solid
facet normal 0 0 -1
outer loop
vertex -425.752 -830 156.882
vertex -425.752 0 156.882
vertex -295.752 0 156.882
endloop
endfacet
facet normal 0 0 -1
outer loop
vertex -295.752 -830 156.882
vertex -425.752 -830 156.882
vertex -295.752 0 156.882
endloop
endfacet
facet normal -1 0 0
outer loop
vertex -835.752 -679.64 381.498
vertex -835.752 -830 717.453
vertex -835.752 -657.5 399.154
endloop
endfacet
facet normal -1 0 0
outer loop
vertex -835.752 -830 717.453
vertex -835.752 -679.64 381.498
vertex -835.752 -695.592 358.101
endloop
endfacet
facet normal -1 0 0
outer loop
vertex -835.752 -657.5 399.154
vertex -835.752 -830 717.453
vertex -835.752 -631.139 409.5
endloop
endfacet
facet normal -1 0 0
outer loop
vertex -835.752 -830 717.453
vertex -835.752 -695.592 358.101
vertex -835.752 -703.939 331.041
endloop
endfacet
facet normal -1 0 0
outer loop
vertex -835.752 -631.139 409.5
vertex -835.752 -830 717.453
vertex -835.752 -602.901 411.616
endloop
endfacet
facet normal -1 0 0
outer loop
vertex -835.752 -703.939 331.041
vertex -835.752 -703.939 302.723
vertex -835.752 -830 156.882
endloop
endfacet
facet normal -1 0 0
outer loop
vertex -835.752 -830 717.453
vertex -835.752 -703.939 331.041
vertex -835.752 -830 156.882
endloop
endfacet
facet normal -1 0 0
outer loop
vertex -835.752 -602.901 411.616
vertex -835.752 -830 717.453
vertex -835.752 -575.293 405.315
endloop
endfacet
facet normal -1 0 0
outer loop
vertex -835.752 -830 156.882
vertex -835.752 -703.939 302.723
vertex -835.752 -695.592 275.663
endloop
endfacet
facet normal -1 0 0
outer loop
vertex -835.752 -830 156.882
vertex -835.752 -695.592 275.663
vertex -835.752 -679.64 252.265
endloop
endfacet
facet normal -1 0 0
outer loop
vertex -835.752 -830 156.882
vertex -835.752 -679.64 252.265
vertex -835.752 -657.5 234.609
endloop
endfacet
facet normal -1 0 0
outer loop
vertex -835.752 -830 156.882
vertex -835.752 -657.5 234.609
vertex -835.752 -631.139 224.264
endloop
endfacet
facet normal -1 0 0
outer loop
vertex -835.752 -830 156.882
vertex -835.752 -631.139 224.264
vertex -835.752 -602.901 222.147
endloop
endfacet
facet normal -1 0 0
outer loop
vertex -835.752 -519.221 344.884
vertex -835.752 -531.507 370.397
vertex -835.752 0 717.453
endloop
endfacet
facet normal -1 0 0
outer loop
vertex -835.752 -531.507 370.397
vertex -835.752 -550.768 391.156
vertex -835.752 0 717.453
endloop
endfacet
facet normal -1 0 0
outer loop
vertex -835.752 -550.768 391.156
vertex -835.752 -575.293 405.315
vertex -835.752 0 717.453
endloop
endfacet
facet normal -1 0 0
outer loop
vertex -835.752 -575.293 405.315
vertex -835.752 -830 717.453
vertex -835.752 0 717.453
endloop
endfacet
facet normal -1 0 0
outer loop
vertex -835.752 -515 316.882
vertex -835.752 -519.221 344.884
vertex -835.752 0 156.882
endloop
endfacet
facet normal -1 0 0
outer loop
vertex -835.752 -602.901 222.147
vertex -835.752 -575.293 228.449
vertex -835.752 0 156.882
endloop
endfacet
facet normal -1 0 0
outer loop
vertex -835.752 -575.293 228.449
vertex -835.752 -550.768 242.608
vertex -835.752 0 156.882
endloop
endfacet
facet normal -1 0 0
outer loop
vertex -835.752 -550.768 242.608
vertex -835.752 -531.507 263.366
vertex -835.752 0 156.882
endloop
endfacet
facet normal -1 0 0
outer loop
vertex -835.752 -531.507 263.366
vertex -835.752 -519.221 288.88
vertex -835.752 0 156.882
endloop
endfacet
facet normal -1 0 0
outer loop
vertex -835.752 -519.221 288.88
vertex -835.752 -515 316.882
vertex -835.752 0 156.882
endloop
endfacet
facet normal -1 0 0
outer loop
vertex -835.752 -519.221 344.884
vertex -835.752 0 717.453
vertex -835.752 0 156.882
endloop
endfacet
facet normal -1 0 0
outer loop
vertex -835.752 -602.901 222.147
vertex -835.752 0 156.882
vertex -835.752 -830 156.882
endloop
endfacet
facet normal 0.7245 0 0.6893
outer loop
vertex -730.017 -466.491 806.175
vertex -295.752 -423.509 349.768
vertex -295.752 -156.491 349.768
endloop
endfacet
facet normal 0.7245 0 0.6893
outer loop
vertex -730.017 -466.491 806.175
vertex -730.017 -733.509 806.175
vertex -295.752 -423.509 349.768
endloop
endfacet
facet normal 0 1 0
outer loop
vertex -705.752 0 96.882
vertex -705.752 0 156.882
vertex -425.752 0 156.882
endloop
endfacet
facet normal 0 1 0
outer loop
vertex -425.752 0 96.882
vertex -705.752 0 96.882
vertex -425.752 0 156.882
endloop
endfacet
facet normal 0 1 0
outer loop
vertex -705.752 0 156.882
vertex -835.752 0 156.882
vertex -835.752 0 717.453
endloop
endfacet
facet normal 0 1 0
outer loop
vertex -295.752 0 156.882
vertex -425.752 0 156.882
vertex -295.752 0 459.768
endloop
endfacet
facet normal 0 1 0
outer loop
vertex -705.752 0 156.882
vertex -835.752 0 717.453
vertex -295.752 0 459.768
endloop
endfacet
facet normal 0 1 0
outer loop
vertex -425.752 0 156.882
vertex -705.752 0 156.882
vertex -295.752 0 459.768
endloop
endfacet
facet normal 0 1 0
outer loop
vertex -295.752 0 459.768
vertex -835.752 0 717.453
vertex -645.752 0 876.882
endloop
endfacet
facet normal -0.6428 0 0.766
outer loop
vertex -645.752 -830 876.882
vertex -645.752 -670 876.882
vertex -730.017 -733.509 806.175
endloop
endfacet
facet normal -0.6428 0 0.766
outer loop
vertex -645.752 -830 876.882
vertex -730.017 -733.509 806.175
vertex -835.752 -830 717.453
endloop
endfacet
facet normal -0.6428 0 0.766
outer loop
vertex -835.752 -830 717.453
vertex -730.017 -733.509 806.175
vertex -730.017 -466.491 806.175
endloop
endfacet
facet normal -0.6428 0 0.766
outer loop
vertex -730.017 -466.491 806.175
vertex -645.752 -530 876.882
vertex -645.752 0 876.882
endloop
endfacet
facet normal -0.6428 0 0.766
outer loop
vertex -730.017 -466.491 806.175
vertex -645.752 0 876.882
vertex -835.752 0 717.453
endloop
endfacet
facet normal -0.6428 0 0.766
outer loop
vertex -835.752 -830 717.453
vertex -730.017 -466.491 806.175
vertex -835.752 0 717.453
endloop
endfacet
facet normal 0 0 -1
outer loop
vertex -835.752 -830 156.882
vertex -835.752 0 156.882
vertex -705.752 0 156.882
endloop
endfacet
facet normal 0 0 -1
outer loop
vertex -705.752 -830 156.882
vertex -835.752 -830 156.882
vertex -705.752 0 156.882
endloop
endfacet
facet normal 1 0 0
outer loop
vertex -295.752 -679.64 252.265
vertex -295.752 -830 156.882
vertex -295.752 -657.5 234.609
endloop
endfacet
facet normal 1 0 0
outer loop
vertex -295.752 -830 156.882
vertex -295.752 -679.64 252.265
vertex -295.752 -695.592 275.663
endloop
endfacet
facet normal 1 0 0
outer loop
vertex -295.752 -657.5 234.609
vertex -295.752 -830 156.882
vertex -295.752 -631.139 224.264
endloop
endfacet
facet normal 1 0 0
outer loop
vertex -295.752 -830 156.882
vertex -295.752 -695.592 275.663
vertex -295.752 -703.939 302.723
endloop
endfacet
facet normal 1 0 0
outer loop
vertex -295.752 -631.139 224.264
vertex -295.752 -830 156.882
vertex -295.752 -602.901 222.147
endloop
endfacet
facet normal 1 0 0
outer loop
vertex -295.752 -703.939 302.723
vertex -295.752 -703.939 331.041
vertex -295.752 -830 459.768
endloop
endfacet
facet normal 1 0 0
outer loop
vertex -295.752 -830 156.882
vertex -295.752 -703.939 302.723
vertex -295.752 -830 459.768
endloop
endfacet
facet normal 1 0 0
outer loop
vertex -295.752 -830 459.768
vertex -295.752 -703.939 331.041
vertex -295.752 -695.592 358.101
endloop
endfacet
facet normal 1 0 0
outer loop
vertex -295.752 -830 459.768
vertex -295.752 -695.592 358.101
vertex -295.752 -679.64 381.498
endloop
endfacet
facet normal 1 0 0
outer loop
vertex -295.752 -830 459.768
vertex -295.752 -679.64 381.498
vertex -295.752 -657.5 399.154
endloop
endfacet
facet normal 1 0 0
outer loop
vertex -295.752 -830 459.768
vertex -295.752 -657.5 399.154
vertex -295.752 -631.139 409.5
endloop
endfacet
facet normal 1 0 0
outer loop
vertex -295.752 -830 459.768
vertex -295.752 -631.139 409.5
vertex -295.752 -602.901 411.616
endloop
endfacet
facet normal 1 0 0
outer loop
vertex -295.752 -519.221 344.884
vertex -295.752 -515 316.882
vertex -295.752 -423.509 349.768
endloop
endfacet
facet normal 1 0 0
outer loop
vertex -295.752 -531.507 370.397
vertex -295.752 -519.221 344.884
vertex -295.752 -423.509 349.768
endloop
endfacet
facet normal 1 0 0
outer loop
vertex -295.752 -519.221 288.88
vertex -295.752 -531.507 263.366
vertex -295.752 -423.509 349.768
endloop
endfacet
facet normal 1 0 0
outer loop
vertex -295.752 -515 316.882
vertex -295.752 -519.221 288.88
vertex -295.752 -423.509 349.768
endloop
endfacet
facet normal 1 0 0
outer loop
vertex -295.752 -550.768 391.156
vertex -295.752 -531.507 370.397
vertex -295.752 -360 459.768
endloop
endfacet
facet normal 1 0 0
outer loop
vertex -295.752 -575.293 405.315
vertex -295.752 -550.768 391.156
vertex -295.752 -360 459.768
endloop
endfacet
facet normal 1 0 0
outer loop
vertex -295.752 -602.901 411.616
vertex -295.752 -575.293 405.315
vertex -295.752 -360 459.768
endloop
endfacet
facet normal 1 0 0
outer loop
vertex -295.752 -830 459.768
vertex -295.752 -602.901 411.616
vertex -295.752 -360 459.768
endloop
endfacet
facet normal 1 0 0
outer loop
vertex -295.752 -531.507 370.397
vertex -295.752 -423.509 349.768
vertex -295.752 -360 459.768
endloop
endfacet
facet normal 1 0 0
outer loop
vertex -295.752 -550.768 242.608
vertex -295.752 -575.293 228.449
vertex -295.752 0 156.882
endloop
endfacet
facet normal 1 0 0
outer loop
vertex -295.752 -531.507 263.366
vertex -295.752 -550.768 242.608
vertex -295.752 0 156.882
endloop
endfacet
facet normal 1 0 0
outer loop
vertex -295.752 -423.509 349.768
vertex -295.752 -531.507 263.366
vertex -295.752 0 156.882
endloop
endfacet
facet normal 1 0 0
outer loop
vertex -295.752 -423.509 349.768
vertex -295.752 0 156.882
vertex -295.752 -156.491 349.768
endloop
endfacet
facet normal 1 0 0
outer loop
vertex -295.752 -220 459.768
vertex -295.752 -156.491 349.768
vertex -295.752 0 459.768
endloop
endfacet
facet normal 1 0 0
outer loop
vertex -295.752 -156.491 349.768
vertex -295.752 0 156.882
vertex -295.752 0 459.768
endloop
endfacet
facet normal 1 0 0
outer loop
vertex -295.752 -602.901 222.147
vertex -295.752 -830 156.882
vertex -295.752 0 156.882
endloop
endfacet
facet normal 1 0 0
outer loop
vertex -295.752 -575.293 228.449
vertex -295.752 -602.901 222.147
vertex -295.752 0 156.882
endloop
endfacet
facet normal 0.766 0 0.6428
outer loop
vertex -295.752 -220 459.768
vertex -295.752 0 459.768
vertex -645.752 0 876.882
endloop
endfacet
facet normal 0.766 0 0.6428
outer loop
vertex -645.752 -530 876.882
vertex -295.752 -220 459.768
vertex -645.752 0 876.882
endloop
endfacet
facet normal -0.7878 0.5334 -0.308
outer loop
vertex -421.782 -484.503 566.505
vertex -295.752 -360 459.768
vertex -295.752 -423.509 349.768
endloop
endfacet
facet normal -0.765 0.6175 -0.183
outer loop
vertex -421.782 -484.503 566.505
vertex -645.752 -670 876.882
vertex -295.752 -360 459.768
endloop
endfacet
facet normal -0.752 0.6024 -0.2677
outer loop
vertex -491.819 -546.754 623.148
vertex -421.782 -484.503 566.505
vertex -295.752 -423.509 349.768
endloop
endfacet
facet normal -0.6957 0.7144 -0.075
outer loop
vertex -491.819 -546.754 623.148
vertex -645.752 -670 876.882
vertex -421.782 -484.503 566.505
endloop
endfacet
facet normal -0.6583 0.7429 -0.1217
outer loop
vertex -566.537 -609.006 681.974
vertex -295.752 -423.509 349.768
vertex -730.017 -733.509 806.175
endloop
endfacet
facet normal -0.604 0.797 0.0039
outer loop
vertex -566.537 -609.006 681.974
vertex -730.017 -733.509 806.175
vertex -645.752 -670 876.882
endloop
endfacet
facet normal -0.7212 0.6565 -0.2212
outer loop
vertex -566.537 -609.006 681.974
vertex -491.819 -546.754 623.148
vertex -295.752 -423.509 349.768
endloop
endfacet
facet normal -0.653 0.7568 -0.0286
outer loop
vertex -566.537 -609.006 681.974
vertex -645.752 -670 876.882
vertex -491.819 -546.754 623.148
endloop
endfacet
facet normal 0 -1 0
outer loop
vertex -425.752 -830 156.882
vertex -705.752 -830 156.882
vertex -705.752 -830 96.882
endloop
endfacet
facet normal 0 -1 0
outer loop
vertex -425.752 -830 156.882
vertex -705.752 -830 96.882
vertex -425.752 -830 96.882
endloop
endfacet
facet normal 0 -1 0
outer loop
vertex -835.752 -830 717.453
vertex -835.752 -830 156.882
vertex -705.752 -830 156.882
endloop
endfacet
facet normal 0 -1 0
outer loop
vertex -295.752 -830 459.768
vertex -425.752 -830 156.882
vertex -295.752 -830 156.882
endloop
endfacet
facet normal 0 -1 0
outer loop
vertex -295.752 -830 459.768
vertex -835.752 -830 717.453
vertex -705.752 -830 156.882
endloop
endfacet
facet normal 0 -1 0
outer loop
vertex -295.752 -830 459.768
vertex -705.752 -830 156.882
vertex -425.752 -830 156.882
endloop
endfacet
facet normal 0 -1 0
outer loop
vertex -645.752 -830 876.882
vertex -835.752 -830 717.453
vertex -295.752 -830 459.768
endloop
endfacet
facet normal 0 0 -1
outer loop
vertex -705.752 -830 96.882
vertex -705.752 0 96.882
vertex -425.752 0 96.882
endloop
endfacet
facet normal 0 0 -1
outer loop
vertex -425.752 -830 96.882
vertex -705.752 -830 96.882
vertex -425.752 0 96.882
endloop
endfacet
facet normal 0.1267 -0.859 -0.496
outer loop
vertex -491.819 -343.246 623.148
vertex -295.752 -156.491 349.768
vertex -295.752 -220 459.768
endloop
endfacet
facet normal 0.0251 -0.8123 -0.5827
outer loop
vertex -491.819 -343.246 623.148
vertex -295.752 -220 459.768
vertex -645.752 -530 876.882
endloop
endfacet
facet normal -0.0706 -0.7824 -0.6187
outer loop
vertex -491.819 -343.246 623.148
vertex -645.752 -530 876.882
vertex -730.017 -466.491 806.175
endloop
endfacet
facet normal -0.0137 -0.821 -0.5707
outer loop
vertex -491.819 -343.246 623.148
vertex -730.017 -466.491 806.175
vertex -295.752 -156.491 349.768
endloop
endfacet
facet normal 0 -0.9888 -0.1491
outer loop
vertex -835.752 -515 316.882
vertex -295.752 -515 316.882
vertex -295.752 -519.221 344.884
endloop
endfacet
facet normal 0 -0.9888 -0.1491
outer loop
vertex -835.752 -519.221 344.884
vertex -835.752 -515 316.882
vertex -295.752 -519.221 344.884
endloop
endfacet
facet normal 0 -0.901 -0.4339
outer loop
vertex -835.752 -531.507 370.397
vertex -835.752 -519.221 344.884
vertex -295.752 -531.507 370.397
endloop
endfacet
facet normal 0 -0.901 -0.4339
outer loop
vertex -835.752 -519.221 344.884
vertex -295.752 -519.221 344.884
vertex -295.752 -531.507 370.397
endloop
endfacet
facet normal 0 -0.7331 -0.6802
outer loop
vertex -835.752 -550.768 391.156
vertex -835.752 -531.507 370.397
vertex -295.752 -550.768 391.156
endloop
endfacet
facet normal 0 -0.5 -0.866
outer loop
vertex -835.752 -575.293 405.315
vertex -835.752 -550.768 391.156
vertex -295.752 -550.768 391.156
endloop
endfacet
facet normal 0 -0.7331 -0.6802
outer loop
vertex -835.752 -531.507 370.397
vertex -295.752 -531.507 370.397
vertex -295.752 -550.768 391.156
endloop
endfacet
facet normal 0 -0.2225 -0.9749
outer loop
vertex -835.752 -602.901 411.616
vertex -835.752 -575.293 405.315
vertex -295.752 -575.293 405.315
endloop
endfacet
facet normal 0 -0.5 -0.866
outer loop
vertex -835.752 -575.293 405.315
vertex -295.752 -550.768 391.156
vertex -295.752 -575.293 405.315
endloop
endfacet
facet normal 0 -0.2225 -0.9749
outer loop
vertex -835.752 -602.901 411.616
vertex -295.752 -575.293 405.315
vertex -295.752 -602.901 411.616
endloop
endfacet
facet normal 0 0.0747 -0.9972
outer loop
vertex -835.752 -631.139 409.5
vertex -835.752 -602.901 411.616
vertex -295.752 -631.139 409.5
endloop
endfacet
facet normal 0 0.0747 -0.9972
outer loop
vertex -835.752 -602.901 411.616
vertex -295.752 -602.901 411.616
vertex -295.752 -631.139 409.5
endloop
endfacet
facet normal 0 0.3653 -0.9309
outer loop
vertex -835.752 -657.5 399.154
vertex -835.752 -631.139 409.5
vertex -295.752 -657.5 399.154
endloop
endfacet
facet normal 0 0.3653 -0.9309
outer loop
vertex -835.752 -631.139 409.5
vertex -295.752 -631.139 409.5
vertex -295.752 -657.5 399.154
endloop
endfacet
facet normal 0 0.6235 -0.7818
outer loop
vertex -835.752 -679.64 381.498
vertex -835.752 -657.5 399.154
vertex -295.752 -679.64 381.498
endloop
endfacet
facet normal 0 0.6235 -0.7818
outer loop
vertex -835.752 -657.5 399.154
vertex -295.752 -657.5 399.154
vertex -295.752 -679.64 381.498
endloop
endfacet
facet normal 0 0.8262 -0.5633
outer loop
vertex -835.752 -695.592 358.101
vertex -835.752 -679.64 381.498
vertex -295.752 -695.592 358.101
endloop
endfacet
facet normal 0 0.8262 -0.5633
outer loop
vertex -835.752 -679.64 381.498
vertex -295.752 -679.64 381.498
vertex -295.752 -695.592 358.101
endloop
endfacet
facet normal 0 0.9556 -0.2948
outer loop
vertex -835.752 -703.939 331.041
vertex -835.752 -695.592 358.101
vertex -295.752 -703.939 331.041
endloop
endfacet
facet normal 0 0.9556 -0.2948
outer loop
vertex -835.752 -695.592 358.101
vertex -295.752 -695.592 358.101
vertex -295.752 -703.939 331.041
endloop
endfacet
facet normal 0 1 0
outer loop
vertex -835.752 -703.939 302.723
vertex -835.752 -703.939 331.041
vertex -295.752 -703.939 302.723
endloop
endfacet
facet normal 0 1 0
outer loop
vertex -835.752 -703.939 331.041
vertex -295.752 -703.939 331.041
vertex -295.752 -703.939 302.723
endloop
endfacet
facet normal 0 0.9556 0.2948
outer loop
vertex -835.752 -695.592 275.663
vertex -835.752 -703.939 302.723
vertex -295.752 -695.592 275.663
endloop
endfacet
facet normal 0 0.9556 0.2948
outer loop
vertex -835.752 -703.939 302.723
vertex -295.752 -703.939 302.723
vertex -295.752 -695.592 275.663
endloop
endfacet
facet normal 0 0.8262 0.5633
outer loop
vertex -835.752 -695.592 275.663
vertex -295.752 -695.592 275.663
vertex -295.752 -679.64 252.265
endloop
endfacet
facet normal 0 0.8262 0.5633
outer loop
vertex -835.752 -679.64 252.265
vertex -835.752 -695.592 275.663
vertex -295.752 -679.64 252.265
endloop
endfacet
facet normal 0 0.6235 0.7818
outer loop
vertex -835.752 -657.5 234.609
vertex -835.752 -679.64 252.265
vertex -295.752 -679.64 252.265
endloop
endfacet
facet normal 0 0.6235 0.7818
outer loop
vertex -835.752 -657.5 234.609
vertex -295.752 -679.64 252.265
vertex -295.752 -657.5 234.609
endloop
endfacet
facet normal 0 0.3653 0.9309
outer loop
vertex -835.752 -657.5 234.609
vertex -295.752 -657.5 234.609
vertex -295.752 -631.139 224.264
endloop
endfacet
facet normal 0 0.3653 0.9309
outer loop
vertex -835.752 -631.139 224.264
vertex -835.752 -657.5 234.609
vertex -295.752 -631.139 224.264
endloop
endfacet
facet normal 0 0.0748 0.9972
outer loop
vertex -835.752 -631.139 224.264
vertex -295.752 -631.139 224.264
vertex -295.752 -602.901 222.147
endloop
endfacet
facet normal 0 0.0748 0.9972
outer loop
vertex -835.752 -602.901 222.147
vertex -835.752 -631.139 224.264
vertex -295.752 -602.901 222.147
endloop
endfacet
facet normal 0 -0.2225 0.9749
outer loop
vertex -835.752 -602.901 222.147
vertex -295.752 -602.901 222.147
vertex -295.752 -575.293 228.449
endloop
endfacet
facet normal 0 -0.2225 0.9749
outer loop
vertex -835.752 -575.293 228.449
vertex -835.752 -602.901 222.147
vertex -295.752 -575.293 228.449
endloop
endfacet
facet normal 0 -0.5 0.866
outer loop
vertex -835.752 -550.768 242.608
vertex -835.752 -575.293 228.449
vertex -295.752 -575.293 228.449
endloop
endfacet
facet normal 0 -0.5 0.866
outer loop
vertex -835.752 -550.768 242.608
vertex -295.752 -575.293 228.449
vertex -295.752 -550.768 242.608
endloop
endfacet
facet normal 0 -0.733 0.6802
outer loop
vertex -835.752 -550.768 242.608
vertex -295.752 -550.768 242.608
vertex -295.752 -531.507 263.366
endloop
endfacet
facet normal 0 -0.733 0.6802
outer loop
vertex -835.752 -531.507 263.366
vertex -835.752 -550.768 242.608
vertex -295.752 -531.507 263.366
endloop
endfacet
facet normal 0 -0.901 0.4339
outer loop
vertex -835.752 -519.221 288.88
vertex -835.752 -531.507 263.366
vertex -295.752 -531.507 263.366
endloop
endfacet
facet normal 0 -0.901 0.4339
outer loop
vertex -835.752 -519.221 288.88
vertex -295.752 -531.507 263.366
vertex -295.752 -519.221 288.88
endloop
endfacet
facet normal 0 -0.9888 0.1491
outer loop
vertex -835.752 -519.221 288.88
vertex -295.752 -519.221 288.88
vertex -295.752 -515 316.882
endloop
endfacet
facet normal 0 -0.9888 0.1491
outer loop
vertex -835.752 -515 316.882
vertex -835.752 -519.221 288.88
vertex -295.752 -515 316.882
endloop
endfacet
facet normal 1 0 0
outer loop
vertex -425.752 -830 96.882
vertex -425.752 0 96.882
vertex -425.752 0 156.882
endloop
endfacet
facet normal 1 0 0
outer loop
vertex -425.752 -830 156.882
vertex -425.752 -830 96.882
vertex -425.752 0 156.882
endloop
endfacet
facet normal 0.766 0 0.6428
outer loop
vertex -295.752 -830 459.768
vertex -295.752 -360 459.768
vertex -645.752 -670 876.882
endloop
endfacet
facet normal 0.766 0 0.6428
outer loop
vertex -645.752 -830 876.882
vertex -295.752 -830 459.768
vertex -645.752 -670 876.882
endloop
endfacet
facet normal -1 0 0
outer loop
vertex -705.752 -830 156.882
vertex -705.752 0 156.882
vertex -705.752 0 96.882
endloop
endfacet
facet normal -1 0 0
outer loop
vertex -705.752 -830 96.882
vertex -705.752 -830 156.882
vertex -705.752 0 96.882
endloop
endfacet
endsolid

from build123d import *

# Parameters (mm, degrees)
F1_DEPTH = 830
F2_R     = 95
F5_DEPTH = 540.001


with BuildPart() as f1:
    # F0 (on Front) → F1 (new body)
    with BuildSketch(Plane.XZ):
        Polygon((-645.752296802, 876.8817598489), (-835.752296802, 717.4528299252), (-835.752296802, 156.8817598489), (-705.752296802, 156.8817598489), (-705.752296802, 96.8817598489), (-425.752296802, 96.8817598489), (-425.752296802, 156.8817598489), (-295.752296802, 156.8817598489), (-295.752296802, 459.7680024409), align=None)
    extrude(amount=F1_DEPTH)

    # F2 (on face) → F4 section 0
    with BuildSketch(Plane.YZ.offset(-295.752296802)):
        Polygon((-220, 459.7680024409), (-360, 459.7680024409), (-423.5085296109, 349.7680024409), (-156.4914703891, 349.7680024409), align=None)
    # F3 (on face) → F4 section 1
    with BuildSketch(Plane(origin=(-698.5892714061, 0, 832.546273946), x_dir=(0.7660444431, 0, 0.6427876097), z_dir=(-0.6427876097, 0, 0.7660444431))):
        Polygon((-41.0262282055, -733.5085296109), (68.9737717945, -670), (68.9737717945, -530), (-41.0262282055, -466.4914703891), align=None)
    loft(mode=Mode.SUBTRACT)

    # F2 (on face) → F5 (cut, through all)
    with BuildSketch(Plane.YZ.offset(-295.752296802)):
        with Locations((-610, 316.8817598489)):
            Circle(F2_R)
    extrude(amount=-F5_DEPTH, mode=Mode.SUBTRACT)


solid = f1.part
